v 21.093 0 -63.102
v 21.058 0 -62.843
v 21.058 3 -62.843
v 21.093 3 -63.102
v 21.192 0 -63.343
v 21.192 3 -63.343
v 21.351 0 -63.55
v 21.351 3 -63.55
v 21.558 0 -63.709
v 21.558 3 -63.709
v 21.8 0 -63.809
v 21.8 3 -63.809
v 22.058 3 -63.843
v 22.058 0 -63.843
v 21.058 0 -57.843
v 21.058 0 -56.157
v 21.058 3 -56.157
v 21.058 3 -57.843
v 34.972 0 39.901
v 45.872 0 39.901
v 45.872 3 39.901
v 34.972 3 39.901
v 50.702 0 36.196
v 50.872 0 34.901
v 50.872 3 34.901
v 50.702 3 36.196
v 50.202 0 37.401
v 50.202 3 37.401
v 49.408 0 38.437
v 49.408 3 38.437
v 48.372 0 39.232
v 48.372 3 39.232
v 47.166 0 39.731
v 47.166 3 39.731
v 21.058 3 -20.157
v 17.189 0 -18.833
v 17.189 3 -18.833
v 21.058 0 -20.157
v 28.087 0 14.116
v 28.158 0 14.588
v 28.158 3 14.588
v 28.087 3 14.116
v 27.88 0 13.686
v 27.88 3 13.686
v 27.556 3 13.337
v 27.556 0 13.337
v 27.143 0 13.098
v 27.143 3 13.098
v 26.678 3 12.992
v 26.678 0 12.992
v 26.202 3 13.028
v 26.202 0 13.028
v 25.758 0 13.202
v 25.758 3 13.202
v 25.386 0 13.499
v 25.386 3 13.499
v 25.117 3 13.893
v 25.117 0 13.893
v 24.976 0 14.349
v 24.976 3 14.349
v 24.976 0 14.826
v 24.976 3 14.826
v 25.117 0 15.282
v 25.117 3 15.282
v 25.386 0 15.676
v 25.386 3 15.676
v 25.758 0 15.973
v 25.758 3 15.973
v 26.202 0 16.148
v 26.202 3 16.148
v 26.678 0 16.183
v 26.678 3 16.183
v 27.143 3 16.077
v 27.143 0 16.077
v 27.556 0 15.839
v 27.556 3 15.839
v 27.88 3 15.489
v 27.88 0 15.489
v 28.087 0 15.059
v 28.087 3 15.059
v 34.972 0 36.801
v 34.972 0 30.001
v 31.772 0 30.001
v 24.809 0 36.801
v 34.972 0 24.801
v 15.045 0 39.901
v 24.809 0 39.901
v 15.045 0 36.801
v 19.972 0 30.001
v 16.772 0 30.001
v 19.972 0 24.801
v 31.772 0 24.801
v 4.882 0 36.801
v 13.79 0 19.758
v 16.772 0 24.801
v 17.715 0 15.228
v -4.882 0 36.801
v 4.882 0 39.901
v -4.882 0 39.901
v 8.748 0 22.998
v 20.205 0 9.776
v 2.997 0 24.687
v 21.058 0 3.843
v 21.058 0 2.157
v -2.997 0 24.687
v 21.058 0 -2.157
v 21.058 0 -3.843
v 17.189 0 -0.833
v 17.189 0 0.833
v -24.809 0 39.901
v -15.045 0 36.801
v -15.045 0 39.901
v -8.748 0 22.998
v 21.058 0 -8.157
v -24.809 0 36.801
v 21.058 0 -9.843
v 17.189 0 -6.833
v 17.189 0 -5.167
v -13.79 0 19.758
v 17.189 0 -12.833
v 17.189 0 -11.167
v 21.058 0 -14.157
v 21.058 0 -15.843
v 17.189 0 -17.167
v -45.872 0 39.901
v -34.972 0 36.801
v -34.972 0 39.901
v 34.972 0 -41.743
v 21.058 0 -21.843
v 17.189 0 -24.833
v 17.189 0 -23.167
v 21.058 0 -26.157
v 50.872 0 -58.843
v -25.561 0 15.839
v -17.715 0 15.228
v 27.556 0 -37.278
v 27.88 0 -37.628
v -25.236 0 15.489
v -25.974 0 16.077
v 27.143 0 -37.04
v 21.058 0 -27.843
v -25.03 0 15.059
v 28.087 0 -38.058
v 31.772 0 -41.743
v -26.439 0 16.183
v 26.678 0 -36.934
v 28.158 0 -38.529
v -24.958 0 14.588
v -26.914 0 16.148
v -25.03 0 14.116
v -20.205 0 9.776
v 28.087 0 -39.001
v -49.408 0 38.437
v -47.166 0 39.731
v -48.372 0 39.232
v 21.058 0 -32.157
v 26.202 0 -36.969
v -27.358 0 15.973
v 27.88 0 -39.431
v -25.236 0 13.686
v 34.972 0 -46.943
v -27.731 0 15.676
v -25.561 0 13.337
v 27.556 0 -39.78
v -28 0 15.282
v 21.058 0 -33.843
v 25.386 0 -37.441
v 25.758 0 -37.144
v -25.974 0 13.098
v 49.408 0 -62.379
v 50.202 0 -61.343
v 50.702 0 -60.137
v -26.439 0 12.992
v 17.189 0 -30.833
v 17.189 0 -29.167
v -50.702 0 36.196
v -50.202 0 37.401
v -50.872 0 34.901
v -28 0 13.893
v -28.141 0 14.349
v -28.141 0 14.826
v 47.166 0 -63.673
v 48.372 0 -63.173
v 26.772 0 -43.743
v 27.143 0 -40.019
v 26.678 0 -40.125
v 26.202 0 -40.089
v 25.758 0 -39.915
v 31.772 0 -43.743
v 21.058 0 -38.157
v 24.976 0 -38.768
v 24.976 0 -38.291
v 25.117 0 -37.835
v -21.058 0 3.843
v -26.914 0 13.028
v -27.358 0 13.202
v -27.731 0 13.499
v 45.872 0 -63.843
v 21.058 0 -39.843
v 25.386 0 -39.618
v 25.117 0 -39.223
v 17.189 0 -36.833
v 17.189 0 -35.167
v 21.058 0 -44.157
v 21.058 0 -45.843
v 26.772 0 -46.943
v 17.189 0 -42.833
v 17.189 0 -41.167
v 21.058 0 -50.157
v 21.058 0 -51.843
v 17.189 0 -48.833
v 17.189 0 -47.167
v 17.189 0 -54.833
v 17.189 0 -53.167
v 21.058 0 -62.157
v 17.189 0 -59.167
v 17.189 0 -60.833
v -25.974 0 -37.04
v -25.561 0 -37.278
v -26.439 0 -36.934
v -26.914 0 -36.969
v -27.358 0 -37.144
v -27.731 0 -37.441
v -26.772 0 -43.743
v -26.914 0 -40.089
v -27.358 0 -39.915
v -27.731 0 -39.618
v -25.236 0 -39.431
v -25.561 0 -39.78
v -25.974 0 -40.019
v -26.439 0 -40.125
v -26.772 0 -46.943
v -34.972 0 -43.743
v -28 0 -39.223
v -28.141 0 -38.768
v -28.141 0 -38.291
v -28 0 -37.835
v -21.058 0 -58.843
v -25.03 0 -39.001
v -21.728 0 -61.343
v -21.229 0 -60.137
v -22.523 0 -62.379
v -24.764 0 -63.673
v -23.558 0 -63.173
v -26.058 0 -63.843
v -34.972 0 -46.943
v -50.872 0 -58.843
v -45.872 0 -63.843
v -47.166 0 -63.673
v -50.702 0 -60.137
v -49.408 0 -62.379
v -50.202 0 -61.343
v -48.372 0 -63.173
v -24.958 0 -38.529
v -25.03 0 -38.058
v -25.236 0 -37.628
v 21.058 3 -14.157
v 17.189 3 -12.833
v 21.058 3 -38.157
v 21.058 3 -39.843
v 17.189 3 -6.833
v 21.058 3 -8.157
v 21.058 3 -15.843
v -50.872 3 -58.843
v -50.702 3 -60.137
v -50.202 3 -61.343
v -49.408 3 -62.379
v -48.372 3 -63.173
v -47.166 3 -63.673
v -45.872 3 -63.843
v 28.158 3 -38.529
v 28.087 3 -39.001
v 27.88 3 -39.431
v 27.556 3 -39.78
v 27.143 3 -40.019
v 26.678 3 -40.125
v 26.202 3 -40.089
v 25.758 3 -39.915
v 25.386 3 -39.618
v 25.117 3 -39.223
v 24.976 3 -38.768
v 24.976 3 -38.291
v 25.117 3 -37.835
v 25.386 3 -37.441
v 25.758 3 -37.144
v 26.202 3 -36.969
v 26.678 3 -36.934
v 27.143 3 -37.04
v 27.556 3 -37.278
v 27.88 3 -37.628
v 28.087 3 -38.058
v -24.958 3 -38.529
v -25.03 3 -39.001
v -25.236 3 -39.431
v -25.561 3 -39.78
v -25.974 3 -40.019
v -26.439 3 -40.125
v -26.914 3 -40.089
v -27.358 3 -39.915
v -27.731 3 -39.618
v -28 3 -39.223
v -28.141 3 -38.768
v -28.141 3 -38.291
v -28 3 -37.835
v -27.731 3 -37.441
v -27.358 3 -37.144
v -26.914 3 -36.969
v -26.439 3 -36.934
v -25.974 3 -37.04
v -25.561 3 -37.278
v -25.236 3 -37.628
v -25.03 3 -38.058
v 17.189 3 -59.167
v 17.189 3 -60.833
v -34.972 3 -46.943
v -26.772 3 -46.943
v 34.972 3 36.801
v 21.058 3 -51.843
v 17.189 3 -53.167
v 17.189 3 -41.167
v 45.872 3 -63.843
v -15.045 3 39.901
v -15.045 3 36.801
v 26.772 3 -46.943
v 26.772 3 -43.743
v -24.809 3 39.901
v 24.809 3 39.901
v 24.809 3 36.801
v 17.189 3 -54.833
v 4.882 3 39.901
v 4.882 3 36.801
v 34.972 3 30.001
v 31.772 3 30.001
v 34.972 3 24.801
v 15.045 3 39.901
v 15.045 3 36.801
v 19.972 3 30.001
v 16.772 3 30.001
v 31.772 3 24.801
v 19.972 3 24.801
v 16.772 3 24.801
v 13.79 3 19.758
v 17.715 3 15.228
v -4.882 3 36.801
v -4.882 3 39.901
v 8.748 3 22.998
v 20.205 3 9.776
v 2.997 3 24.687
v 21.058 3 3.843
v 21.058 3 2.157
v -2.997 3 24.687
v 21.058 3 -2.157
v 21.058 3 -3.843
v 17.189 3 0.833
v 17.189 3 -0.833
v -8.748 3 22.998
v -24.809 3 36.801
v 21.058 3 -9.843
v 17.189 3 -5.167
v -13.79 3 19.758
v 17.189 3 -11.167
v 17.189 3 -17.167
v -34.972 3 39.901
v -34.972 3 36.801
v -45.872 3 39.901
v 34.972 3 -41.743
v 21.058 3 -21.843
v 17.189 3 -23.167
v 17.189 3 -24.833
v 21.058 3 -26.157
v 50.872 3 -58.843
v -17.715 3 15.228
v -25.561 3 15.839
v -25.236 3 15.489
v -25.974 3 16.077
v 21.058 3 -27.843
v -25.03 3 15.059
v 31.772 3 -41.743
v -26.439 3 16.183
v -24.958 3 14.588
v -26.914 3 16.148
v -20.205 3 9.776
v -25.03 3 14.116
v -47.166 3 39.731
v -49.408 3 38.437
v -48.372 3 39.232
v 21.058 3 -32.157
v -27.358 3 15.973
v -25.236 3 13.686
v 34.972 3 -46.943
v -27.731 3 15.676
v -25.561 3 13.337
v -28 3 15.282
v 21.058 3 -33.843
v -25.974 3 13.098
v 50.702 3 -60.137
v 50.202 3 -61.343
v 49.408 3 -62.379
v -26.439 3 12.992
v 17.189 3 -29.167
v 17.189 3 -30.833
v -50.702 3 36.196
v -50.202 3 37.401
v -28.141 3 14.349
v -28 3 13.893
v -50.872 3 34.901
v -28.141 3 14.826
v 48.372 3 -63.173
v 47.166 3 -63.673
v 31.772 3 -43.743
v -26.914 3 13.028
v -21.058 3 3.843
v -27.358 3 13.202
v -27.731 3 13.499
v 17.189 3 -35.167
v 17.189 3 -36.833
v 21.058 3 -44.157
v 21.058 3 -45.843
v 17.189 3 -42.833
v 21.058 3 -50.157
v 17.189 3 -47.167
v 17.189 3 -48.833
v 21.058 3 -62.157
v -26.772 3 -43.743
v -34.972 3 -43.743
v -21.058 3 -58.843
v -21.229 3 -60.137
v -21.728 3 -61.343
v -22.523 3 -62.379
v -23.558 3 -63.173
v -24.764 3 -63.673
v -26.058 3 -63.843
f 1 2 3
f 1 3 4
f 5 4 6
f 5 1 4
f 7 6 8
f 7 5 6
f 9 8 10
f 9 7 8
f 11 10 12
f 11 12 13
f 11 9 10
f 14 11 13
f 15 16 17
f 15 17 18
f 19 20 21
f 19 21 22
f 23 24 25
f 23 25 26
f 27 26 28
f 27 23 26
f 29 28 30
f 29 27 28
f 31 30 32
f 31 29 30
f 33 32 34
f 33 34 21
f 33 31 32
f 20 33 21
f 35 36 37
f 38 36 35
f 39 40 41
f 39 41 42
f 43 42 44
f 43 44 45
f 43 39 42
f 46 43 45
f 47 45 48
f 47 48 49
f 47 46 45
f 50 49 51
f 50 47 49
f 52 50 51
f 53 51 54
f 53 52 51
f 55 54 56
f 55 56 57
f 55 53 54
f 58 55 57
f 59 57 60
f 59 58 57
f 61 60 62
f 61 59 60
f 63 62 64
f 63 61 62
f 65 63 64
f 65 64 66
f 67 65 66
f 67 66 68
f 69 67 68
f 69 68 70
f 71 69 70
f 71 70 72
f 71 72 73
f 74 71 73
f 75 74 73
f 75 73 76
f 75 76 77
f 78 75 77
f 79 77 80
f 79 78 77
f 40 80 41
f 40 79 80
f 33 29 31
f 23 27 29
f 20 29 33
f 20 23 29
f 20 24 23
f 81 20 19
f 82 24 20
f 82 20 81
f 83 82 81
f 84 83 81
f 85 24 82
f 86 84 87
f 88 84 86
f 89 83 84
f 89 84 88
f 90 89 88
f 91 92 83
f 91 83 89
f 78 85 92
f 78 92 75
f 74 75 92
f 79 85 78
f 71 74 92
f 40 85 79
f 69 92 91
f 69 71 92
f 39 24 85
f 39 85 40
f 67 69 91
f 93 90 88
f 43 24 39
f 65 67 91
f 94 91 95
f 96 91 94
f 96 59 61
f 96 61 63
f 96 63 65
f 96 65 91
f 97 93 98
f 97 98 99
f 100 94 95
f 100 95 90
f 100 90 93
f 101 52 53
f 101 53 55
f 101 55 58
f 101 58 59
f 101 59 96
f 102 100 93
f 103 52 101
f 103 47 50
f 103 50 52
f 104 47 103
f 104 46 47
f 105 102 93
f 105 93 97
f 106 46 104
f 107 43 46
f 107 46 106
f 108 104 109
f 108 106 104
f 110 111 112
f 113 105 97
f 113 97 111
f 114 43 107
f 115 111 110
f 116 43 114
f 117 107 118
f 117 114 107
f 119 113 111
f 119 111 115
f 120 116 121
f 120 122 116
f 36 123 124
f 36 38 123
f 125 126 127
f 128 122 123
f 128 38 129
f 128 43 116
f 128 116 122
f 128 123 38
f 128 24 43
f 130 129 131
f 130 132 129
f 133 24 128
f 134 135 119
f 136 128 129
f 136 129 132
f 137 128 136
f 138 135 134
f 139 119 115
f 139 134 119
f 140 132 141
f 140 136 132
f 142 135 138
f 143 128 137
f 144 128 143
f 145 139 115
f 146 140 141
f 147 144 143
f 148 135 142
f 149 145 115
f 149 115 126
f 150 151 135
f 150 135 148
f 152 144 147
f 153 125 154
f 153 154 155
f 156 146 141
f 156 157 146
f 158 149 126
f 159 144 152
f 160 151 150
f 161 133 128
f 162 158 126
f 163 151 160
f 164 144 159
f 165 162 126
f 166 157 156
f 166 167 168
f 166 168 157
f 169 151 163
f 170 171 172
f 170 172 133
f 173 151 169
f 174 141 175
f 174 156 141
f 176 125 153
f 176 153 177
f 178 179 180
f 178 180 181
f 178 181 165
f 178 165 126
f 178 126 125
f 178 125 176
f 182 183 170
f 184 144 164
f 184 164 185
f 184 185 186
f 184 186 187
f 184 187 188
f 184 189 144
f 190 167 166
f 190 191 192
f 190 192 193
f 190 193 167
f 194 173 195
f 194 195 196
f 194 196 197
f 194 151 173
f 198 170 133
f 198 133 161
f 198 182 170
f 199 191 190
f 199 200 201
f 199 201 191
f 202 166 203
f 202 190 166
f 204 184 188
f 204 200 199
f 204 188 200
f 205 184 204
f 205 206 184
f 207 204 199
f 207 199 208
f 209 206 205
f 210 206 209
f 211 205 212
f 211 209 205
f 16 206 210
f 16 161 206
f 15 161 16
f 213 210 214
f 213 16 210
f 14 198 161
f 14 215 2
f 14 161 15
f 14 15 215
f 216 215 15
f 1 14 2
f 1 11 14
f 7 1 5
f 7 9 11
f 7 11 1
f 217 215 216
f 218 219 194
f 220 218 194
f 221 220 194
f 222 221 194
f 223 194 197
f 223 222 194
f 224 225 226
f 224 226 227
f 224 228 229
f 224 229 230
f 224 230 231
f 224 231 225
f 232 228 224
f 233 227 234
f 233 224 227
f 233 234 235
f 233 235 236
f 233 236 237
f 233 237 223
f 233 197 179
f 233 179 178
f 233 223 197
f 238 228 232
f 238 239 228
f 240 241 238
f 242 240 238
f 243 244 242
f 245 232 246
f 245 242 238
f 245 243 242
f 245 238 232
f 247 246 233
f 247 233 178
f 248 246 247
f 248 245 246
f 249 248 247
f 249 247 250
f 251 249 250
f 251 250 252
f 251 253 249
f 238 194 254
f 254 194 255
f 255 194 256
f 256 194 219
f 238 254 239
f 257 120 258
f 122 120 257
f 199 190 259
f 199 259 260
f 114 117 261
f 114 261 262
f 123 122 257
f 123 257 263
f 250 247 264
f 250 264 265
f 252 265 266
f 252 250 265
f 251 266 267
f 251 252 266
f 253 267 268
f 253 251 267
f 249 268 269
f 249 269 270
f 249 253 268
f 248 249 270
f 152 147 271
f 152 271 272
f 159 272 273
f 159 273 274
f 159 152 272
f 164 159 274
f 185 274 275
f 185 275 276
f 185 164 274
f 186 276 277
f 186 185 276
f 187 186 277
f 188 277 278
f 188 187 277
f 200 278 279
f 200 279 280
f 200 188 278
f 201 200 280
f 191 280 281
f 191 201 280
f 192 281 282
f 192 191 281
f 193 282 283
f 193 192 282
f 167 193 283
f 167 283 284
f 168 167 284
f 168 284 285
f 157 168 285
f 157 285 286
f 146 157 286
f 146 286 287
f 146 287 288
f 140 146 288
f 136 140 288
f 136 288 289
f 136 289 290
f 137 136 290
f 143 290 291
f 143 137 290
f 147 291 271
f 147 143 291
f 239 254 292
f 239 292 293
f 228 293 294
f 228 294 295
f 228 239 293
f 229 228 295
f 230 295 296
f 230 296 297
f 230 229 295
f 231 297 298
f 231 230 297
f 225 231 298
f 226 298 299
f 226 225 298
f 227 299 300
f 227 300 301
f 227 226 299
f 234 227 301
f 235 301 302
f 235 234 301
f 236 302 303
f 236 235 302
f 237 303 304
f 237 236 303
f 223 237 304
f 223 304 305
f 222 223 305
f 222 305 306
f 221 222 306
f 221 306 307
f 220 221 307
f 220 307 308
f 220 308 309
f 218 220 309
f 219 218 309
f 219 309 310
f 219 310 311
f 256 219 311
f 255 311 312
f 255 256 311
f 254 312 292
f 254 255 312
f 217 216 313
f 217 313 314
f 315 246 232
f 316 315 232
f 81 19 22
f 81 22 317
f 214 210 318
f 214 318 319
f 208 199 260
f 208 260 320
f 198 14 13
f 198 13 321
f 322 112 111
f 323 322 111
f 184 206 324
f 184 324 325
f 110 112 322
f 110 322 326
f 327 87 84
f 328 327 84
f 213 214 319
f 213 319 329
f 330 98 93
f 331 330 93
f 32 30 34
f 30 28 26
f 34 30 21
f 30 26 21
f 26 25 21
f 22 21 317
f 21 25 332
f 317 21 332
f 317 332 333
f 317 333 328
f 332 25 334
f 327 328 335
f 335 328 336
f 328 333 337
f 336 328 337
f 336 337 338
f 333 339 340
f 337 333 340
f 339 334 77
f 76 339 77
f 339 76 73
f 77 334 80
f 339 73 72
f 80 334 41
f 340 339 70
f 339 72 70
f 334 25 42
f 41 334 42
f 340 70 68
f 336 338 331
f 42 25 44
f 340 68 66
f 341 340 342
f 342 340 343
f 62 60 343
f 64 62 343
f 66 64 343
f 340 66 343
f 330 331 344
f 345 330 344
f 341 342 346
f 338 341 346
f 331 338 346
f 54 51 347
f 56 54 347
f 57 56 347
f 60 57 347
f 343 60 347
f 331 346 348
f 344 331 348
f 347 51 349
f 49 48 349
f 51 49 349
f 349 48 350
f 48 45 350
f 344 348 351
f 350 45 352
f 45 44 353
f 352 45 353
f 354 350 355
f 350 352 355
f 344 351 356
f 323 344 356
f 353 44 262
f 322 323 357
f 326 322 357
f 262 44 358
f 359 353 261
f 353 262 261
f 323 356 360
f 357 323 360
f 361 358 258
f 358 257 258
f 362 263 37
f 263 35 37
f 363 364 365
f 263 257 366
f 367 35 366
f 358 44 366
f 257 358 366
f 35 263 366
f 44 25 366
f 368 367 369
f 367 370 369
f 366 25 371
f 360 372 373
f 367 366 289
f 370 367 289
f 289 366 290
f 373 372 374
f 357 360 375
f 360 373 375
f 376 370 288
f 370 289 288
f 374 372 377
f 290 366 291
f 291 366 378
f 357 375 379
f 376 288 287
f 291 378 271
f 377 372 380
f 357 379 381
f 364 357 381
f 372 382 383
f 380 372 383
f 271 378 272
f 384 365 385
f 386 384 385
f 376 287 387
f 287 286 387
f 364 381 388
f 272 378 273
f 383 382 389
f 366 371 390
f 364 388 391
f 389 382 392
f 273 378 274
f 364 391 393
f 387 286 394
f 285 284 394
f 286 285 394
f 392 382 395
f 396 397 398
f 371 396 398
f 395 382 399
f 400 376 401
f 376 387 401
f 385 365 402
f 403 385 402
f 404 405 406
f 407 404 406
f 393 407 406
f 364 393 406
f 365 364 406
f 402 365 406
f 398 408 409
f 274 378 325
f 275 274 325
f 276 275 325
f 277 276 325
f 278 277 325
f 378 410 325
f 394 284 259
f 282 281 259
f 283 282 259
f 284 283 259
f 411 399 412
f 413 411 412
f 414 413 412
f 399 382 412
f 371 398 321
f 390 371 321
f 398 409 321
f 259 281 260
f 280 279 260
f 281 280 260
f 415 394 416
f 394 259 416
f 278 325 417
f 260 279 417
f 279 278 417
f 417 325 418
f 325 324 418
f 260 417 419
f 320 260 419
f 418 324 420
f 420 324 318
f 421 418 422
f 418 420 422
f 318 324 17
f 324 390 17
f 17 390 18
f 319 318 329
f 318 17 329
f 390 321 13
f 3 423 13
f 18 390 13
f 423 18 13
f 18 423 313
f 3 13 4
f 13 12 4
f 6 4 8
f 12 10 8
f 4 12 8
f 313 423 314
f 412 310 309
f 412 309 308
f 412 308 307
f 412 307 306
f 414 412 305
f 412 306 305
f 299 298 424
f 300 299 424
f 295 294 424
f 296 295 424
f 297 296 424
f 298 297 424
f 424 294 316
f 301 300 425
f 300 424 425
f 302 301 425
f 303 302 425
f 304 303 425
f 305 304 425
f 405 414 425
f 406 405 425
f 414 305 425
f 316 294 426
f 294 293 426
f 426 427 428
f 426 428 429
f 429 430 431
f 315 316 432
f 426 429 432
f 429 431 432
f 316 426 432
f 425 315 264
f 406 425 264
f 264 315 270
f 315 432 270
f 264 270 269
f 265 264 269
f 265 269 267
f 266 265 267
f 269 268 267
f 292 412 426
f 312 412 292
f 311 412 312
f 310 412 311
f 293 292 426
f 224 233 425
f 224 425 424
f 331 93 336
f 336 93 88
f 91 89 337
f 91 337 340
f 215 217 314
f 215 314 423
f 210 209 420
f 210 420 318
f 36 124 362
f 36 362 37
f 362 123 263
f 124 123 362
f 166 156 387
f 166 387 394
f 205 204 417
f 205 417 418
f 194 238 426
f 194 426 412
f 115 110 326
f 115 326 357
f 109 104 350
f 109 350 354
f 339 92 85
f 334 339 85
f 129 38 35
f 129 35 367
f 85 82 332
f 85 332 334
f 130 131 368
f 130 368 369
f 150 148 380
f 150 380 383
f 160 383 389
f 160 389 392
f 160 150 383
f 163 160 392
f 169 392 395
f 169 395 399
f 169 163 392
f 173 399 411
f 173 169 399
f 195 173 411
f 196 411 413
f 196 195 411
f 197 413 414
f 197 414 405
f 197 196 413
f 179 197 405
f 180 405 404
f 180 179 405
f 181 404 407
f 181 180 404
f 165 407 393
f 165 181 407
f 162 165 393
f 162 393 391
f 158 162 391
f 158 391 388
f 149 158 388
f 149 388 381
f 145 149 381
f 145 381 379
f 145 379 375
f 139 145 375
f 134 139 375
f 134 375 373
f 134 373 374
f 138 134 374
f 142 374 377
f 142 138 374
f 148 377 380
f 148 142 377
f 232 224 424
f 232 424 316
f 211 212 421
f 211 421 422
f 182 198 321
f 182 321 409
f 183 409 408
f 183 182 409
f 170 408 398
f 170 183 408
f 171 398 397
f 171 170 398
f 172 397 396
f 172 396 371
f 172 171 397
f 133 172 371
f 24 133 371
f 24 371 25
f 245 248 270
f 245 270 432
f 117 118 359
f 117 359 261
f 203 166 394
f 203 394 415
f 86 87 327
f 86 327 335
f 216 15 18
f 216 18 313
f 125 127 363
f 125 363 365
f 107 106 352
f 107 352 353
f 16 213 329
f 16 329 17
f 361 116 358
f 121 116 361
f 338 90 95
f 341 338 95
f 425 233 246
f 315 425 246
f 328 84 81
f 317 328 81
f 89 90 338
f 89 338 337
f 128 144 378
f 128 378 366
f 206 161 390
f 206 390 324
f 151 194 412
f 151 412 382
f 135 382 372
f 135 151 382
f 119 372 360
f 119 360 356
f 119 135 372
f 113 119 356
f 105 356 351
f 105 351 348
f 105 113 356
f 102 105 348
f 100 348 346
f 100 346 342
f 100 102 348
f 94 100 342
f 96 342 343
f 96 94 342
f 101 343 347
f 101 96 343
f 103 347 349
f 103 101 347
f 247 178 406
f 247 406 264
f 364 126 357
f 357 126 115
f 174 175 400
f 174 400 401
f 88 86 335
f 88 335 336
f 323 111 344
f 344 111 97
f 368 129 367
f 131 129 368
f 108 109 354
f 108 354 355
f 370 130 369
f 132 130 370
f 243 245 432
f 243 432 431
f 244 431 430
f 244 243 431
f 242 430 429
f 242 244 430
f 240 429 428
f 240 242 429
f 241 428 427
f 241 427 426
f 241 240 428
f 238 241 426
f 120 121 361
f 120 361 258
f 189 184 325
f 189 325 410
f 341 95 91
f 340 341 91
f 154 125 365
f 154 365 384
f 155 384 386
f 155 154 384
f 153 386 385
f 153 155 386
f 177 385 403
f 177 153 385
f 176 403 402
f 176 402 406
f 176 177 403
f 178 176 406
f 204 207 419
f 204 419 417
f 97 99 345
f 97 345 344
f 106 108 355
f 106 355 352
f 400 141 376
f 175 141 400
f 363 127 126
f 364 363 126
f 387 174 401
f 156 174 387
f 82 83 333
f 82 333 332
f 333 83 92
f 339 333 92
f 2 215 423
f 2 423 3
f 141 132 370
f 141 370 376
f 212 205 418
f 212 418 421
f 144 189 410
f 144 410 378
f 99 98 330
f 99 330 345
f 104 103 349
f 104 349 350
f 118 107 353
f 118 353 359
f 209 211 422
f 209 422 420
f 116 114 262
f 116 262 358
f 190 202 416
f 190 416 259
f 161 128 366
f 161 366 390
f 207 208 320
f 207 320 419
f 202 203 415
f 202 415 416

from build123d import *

# Parameters (mm, degrees)
SKETCH1_R           = 1.6
BOSS_EXTRUDE1_DEPTH = 3
SKETCH6_W           = 10.163490601
SKETCH6_H           = 3.2
SKETCH6_W_2         = 8.2
SKETCH6_W_3         = 3.2
SKETCH6_H_2         = 5.2
CUT_EXTRUDE4_DEPTH  = 4


with BuildPart() as part:
    # Sketch1 → Boss-Extrude1 (new body)
    with BuildSketch(Plane(origin=(0, 0, 0), x_dir=(1, 0, 0), z_dir=(0, 1, 0))):
        with BuildLine():
            Line((21.058452488, 3.842990858), (17.188733854, 5.16651258))
            Line((17.188733854, 5.16651258), (17.188733854, 6.83348742))
            Line((17.188733854, 6.83348742), (21.058452488, 8.157009142))
            Line((21.058452488, 8.157009142), (21.058452488, 9.842990858))
            Line((21.058452488, 9.842990858), (17.188733854, 11.16651258))
            Line((17.188733854, 11.16651258), (17.188733854, 12.83348742))
            Line((17.188733854, 12.83348742), (21.058452488, 14.157009142))
            Line((21.058452488, 14.157009142), (21.058452488, 15.842990858))
            Line((21.058452488, 15.842990858), (17.188733854, 17.16651258))
            Line((17.188733854, 17.16651258), (17.188733854, 18.83348742))
            Line((17.188733854, 18.83348742), (21.058452488, 20.157009142))
            Line((21.058452488, 20.157009142), (21.058452488, 21.842990858))
            Line((21.058452488, 21.842990858), (17.188733854, 23.16651258))
            Line((17.188733854, 23.16651258), (17.188733854, 24.83348742))
            Line((17.188733854, 24.83348742), (21.058452488, 26.157009142))
            Line((21.058452488, 26.157009142), (21.058452488, 27.842990858))
            Line((21.058452488, 27.842990858), (17.188733854, 29.16651258))
            Line((17.188733854, 29.16651258), (17.188733854, 30.83348742))
            Line((17.188733854, 30.83348742), (21.058452488, 32.157009142))
            Line((21.058452488, 32.157009142), (21.058452488, 33.842990858))
            Line((21.058452488, 33.842990858), (17.188733854, 35.16651258))
            Line((17.188733854, 35.16651258), (17.188733854, 36.83348742))
            Line((17.188733854, 36.83348742), (21.058452488, 38.157009142))
            Line((21.058452488, 38.157009142), (21.058452488, 39.842990858))
            Line((21.058452488, 39.842990858), (17.188733854, 41.16651258))
            Line((17.188733854, 41.16651258), (17.188733854, 42.83348742))
            Line((17.188733854, 42.83348742), (21.058452488, 44.157009142))
            Line((21.058452488, 44.157009142), (21.058452488, 45.842990858))
            Line((21.058452488, 45.842990858), (17.188733854, 47.16651258))
            Line((17.188733854, 47.16651258), (17.188733854, 48.83348742))
            Line((17.188733854, 48.83348742), (21.058452488, 50.157009142))
            Line((21.058452488, 50.157009142), (21.058452488, 51.842990858))
            Line((21.058452488, 51.842990858), (17.188733854, 53.16651258))
            Line((17.188733854, 53.16651258), (17.188733854, 54.83348742))
            Line((17.188733854, 54.83348742), (21.058452488, 56.157009142))
            Line((21.058452488, 56.157009142), (21.058452488, 57.842990858))
            Line((21.058452488, 57.842990858), (17.188733854, 59.16651258))
            Line((17.188733854, 59.16651258), (17.188733854, 60.83348742))
            Line((17.188733854, 60.83348742), (21.058452488, 62.157009142))
            Line((21.058452488, 62.157009142), (21.058452488, 62.842990858))
            ThreePointArc((21.058452488, 62.842990858), (21.351345707, 63.550097639), (22.058452488, 63.842990858))
            Line((22.058452488, 63.842990858), (45.872217102, 63.842990858))
            ThreePointArc((45.872217102, 63.842990858), (49.407751008, 62.378524764), (50.872217102, 58.842990858))
            Line((50.872217102, 58.842990858), (50.872217102, -34.901443346))
            ThreePointArc((50.872217102, -34.901443346), (49.407751008, -38.436977252), (45.872217102, -39.901443346))
            Line((45.872217102, -39.901443346), (-45.872217102, -39.901443346))
            ThreePointArc((-45.872217102, -39.901443346), (-49.407751008, -38.436977252), (-50.872217102, -34.901443346))
            Line((-50.872217102, -34.901443346), (-50.872217102, 58.842990858))
            ThreePointArc((-50.872217102, 58.842990858), (-49.407751008, 62.378524764), (-45.872217102, 63.842990858))
            Line((-45.872217102, 63.842990858), (-26.058452488, 63.842990858))
            ThreePointArc((-26.058452488, 63.842990858), (-22.522918582, 62.378524764), (-21.058452488, 58.842990858))
            Line((-21.058452488, 58.842990858), (-21.058452488, -3.842990858))
            ThreePointArc((-21.058452488, -3.842990858), (0, -24.901443346), (21.058452488, -3.842990858))
            Line((21.058452488, -3.842990858), (21.058452488, -2.157009142))
            Line((21.058452488, -2.157009142), (17.188733854, -0.83348742))
            Line((17.188733854, -0.83348742), (17.188733854, 0.83348742))
            Line((17.188733854, 0.83348742), (21.058452488, 2.157009142))
            Line((21.058452488, 2.157009142), (21.058452488, 3.842990858))
        make_face()
        with Locations((26.558452488, -14.587678732)):
            Circle(SKETCH1_R, mode=Mode.SUBTRACT)
        with Locations((-26.558452488, -14.587678732)):
            Circle(SKETCH1_R, mode=Mode.SUBTRACT)
        with Locations((-26.558452488, 38.529226244)):
            Circle(SKETCH1_R, mode=Mode.SUBTRACT)
        with Locations((26.558452488, 38.529226244)):
            Circle(SKETCH1_R, mode=Mode.SUBTRACT)
    extrude(amount=BOSS_EXTRUDE1_DEPTH)

    # Sketch6 → Cut-Extrude4 (cut, through all)
    with BuildSketch(Plane(origin=(0, 0, 0), x_dir=(1, 0, 0), z_dir=(0, 1, 0))):
        with Locations((9.963490601, -38.401443346)):
            Rectangle(SKETCH6_W, SKETCH6_H)
        with Locations((29.890471802, -38.401443346)):
            Rectangle(SKETCH6_W, SKETCH6_H)
        with Locations((-29.890471802, -38.401443346)):
            Rectangle(SKETCH6_W, SKETCH6_H)
        with Locations((-9.963490601, -38.401443346)):
            Rectangle(SKETCH6_W, SKETCH6_H)
        with Locations((-30.872217102, 45.342990858)):
            Rectangle(SKETCH6_W_2, SKETCH6_H)
        with Locations((33.372217102, -27.401443346)):
            Rectangle(SKETCH6_W_3, SKETCH6_H_2)
        Polygon((34.972217102, 41.742990858), (34.972217102, 46.942990858), (26.772217102, 46.942990858), (26.772217102, 43.742990858), (31.772217102, 43.742990858), (31.772217102, 41.742990858), align=None)
        with Locations((18.372217102, -27.401443346)):
            Rectangle(SKETCH6_W_3, SKETCH6_H_2)
    extrude(amount=CUT_EXTRUDE4_DEPTH, mode=Mode.SUBTRACT)


solid = part.part
